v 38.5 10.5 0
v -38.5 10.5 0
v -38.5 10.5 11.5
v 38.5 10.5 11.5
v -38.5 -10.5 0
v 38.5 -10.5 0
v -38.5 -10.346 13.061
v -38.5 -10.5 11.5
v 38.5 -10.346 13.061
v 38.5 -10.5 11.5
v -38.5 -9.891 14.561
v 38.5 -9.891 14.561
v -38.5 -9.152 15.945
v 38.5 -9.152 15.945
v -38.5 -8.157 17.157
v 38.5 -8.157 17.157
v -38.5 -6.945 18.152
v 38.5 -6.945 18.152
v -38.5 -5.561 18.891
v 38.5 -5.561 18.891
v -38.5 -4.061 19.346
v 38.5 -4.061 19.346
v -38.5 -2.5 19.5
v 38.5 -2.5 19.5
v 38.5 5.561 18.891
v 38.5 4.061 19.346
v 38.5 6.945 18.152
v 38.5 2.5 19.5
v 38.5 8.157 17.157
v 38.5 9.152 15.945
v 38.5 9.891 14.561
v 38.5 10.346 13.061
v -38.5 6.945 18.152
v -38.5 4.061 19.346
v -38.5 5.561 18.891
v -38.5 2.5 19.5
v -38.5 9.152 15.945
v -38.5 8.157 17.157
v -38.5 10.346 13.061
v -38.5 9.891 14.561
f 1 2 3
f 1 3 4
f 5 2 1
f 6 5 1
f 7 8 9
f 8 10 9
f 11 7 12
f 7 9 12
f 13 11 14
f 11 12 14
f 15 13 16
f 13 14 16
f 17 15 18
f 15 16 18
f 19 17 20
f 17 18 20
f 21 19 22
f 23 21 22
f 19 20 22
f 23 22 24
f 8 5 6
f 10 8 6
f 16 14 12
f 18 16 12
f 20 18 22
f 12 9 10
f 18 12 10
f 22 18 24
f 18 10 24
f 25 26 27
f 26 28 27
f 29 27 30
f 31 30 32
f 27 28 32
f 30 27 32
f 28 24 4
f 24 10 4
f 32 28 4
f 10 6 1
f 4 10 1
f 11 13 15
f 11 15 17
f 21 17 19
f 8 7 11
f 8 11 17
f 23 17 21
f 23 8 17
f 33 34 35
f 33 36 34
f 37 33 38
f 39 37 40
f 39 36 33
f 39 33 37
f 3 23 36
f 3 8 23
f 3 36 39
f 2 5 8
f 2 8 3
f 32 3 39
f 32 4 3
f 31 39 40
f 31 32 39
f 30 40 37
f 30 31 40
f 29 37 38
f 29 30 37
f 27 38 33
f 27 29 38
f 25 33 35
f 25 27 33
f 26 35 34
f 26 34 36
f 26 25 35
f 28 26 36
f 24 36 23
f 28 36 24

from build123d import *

# Parameters (mm, degrees)
SKICA1_W                = 77
SKICA1_H                = 21
P_IDAT_VYSUNUT_M1_DEPTH = 19.5
ZAOBLIT1_R              = 8


with BuildPart() as part:
    # Skica1 → Přidat vysunutím1 (new body)
    with BuildSketch(Plane.XY):
        Rectangle(SKICA1_W, SKICA1_H)
    extrude(amount=P_IDAT_VYSUNUT_M1_DEPTH)

    # Zaoblit1
    zaoblit1_edges = [part.edges().sort_by_distance(p)[0] for p in [
        (0, -10.5, 19.5),
        (0, 10.5, 19.5),
    ]]
    fillet(zaoblit1_edges, radius=ZAOBLIT1_R)


solid = part.part
